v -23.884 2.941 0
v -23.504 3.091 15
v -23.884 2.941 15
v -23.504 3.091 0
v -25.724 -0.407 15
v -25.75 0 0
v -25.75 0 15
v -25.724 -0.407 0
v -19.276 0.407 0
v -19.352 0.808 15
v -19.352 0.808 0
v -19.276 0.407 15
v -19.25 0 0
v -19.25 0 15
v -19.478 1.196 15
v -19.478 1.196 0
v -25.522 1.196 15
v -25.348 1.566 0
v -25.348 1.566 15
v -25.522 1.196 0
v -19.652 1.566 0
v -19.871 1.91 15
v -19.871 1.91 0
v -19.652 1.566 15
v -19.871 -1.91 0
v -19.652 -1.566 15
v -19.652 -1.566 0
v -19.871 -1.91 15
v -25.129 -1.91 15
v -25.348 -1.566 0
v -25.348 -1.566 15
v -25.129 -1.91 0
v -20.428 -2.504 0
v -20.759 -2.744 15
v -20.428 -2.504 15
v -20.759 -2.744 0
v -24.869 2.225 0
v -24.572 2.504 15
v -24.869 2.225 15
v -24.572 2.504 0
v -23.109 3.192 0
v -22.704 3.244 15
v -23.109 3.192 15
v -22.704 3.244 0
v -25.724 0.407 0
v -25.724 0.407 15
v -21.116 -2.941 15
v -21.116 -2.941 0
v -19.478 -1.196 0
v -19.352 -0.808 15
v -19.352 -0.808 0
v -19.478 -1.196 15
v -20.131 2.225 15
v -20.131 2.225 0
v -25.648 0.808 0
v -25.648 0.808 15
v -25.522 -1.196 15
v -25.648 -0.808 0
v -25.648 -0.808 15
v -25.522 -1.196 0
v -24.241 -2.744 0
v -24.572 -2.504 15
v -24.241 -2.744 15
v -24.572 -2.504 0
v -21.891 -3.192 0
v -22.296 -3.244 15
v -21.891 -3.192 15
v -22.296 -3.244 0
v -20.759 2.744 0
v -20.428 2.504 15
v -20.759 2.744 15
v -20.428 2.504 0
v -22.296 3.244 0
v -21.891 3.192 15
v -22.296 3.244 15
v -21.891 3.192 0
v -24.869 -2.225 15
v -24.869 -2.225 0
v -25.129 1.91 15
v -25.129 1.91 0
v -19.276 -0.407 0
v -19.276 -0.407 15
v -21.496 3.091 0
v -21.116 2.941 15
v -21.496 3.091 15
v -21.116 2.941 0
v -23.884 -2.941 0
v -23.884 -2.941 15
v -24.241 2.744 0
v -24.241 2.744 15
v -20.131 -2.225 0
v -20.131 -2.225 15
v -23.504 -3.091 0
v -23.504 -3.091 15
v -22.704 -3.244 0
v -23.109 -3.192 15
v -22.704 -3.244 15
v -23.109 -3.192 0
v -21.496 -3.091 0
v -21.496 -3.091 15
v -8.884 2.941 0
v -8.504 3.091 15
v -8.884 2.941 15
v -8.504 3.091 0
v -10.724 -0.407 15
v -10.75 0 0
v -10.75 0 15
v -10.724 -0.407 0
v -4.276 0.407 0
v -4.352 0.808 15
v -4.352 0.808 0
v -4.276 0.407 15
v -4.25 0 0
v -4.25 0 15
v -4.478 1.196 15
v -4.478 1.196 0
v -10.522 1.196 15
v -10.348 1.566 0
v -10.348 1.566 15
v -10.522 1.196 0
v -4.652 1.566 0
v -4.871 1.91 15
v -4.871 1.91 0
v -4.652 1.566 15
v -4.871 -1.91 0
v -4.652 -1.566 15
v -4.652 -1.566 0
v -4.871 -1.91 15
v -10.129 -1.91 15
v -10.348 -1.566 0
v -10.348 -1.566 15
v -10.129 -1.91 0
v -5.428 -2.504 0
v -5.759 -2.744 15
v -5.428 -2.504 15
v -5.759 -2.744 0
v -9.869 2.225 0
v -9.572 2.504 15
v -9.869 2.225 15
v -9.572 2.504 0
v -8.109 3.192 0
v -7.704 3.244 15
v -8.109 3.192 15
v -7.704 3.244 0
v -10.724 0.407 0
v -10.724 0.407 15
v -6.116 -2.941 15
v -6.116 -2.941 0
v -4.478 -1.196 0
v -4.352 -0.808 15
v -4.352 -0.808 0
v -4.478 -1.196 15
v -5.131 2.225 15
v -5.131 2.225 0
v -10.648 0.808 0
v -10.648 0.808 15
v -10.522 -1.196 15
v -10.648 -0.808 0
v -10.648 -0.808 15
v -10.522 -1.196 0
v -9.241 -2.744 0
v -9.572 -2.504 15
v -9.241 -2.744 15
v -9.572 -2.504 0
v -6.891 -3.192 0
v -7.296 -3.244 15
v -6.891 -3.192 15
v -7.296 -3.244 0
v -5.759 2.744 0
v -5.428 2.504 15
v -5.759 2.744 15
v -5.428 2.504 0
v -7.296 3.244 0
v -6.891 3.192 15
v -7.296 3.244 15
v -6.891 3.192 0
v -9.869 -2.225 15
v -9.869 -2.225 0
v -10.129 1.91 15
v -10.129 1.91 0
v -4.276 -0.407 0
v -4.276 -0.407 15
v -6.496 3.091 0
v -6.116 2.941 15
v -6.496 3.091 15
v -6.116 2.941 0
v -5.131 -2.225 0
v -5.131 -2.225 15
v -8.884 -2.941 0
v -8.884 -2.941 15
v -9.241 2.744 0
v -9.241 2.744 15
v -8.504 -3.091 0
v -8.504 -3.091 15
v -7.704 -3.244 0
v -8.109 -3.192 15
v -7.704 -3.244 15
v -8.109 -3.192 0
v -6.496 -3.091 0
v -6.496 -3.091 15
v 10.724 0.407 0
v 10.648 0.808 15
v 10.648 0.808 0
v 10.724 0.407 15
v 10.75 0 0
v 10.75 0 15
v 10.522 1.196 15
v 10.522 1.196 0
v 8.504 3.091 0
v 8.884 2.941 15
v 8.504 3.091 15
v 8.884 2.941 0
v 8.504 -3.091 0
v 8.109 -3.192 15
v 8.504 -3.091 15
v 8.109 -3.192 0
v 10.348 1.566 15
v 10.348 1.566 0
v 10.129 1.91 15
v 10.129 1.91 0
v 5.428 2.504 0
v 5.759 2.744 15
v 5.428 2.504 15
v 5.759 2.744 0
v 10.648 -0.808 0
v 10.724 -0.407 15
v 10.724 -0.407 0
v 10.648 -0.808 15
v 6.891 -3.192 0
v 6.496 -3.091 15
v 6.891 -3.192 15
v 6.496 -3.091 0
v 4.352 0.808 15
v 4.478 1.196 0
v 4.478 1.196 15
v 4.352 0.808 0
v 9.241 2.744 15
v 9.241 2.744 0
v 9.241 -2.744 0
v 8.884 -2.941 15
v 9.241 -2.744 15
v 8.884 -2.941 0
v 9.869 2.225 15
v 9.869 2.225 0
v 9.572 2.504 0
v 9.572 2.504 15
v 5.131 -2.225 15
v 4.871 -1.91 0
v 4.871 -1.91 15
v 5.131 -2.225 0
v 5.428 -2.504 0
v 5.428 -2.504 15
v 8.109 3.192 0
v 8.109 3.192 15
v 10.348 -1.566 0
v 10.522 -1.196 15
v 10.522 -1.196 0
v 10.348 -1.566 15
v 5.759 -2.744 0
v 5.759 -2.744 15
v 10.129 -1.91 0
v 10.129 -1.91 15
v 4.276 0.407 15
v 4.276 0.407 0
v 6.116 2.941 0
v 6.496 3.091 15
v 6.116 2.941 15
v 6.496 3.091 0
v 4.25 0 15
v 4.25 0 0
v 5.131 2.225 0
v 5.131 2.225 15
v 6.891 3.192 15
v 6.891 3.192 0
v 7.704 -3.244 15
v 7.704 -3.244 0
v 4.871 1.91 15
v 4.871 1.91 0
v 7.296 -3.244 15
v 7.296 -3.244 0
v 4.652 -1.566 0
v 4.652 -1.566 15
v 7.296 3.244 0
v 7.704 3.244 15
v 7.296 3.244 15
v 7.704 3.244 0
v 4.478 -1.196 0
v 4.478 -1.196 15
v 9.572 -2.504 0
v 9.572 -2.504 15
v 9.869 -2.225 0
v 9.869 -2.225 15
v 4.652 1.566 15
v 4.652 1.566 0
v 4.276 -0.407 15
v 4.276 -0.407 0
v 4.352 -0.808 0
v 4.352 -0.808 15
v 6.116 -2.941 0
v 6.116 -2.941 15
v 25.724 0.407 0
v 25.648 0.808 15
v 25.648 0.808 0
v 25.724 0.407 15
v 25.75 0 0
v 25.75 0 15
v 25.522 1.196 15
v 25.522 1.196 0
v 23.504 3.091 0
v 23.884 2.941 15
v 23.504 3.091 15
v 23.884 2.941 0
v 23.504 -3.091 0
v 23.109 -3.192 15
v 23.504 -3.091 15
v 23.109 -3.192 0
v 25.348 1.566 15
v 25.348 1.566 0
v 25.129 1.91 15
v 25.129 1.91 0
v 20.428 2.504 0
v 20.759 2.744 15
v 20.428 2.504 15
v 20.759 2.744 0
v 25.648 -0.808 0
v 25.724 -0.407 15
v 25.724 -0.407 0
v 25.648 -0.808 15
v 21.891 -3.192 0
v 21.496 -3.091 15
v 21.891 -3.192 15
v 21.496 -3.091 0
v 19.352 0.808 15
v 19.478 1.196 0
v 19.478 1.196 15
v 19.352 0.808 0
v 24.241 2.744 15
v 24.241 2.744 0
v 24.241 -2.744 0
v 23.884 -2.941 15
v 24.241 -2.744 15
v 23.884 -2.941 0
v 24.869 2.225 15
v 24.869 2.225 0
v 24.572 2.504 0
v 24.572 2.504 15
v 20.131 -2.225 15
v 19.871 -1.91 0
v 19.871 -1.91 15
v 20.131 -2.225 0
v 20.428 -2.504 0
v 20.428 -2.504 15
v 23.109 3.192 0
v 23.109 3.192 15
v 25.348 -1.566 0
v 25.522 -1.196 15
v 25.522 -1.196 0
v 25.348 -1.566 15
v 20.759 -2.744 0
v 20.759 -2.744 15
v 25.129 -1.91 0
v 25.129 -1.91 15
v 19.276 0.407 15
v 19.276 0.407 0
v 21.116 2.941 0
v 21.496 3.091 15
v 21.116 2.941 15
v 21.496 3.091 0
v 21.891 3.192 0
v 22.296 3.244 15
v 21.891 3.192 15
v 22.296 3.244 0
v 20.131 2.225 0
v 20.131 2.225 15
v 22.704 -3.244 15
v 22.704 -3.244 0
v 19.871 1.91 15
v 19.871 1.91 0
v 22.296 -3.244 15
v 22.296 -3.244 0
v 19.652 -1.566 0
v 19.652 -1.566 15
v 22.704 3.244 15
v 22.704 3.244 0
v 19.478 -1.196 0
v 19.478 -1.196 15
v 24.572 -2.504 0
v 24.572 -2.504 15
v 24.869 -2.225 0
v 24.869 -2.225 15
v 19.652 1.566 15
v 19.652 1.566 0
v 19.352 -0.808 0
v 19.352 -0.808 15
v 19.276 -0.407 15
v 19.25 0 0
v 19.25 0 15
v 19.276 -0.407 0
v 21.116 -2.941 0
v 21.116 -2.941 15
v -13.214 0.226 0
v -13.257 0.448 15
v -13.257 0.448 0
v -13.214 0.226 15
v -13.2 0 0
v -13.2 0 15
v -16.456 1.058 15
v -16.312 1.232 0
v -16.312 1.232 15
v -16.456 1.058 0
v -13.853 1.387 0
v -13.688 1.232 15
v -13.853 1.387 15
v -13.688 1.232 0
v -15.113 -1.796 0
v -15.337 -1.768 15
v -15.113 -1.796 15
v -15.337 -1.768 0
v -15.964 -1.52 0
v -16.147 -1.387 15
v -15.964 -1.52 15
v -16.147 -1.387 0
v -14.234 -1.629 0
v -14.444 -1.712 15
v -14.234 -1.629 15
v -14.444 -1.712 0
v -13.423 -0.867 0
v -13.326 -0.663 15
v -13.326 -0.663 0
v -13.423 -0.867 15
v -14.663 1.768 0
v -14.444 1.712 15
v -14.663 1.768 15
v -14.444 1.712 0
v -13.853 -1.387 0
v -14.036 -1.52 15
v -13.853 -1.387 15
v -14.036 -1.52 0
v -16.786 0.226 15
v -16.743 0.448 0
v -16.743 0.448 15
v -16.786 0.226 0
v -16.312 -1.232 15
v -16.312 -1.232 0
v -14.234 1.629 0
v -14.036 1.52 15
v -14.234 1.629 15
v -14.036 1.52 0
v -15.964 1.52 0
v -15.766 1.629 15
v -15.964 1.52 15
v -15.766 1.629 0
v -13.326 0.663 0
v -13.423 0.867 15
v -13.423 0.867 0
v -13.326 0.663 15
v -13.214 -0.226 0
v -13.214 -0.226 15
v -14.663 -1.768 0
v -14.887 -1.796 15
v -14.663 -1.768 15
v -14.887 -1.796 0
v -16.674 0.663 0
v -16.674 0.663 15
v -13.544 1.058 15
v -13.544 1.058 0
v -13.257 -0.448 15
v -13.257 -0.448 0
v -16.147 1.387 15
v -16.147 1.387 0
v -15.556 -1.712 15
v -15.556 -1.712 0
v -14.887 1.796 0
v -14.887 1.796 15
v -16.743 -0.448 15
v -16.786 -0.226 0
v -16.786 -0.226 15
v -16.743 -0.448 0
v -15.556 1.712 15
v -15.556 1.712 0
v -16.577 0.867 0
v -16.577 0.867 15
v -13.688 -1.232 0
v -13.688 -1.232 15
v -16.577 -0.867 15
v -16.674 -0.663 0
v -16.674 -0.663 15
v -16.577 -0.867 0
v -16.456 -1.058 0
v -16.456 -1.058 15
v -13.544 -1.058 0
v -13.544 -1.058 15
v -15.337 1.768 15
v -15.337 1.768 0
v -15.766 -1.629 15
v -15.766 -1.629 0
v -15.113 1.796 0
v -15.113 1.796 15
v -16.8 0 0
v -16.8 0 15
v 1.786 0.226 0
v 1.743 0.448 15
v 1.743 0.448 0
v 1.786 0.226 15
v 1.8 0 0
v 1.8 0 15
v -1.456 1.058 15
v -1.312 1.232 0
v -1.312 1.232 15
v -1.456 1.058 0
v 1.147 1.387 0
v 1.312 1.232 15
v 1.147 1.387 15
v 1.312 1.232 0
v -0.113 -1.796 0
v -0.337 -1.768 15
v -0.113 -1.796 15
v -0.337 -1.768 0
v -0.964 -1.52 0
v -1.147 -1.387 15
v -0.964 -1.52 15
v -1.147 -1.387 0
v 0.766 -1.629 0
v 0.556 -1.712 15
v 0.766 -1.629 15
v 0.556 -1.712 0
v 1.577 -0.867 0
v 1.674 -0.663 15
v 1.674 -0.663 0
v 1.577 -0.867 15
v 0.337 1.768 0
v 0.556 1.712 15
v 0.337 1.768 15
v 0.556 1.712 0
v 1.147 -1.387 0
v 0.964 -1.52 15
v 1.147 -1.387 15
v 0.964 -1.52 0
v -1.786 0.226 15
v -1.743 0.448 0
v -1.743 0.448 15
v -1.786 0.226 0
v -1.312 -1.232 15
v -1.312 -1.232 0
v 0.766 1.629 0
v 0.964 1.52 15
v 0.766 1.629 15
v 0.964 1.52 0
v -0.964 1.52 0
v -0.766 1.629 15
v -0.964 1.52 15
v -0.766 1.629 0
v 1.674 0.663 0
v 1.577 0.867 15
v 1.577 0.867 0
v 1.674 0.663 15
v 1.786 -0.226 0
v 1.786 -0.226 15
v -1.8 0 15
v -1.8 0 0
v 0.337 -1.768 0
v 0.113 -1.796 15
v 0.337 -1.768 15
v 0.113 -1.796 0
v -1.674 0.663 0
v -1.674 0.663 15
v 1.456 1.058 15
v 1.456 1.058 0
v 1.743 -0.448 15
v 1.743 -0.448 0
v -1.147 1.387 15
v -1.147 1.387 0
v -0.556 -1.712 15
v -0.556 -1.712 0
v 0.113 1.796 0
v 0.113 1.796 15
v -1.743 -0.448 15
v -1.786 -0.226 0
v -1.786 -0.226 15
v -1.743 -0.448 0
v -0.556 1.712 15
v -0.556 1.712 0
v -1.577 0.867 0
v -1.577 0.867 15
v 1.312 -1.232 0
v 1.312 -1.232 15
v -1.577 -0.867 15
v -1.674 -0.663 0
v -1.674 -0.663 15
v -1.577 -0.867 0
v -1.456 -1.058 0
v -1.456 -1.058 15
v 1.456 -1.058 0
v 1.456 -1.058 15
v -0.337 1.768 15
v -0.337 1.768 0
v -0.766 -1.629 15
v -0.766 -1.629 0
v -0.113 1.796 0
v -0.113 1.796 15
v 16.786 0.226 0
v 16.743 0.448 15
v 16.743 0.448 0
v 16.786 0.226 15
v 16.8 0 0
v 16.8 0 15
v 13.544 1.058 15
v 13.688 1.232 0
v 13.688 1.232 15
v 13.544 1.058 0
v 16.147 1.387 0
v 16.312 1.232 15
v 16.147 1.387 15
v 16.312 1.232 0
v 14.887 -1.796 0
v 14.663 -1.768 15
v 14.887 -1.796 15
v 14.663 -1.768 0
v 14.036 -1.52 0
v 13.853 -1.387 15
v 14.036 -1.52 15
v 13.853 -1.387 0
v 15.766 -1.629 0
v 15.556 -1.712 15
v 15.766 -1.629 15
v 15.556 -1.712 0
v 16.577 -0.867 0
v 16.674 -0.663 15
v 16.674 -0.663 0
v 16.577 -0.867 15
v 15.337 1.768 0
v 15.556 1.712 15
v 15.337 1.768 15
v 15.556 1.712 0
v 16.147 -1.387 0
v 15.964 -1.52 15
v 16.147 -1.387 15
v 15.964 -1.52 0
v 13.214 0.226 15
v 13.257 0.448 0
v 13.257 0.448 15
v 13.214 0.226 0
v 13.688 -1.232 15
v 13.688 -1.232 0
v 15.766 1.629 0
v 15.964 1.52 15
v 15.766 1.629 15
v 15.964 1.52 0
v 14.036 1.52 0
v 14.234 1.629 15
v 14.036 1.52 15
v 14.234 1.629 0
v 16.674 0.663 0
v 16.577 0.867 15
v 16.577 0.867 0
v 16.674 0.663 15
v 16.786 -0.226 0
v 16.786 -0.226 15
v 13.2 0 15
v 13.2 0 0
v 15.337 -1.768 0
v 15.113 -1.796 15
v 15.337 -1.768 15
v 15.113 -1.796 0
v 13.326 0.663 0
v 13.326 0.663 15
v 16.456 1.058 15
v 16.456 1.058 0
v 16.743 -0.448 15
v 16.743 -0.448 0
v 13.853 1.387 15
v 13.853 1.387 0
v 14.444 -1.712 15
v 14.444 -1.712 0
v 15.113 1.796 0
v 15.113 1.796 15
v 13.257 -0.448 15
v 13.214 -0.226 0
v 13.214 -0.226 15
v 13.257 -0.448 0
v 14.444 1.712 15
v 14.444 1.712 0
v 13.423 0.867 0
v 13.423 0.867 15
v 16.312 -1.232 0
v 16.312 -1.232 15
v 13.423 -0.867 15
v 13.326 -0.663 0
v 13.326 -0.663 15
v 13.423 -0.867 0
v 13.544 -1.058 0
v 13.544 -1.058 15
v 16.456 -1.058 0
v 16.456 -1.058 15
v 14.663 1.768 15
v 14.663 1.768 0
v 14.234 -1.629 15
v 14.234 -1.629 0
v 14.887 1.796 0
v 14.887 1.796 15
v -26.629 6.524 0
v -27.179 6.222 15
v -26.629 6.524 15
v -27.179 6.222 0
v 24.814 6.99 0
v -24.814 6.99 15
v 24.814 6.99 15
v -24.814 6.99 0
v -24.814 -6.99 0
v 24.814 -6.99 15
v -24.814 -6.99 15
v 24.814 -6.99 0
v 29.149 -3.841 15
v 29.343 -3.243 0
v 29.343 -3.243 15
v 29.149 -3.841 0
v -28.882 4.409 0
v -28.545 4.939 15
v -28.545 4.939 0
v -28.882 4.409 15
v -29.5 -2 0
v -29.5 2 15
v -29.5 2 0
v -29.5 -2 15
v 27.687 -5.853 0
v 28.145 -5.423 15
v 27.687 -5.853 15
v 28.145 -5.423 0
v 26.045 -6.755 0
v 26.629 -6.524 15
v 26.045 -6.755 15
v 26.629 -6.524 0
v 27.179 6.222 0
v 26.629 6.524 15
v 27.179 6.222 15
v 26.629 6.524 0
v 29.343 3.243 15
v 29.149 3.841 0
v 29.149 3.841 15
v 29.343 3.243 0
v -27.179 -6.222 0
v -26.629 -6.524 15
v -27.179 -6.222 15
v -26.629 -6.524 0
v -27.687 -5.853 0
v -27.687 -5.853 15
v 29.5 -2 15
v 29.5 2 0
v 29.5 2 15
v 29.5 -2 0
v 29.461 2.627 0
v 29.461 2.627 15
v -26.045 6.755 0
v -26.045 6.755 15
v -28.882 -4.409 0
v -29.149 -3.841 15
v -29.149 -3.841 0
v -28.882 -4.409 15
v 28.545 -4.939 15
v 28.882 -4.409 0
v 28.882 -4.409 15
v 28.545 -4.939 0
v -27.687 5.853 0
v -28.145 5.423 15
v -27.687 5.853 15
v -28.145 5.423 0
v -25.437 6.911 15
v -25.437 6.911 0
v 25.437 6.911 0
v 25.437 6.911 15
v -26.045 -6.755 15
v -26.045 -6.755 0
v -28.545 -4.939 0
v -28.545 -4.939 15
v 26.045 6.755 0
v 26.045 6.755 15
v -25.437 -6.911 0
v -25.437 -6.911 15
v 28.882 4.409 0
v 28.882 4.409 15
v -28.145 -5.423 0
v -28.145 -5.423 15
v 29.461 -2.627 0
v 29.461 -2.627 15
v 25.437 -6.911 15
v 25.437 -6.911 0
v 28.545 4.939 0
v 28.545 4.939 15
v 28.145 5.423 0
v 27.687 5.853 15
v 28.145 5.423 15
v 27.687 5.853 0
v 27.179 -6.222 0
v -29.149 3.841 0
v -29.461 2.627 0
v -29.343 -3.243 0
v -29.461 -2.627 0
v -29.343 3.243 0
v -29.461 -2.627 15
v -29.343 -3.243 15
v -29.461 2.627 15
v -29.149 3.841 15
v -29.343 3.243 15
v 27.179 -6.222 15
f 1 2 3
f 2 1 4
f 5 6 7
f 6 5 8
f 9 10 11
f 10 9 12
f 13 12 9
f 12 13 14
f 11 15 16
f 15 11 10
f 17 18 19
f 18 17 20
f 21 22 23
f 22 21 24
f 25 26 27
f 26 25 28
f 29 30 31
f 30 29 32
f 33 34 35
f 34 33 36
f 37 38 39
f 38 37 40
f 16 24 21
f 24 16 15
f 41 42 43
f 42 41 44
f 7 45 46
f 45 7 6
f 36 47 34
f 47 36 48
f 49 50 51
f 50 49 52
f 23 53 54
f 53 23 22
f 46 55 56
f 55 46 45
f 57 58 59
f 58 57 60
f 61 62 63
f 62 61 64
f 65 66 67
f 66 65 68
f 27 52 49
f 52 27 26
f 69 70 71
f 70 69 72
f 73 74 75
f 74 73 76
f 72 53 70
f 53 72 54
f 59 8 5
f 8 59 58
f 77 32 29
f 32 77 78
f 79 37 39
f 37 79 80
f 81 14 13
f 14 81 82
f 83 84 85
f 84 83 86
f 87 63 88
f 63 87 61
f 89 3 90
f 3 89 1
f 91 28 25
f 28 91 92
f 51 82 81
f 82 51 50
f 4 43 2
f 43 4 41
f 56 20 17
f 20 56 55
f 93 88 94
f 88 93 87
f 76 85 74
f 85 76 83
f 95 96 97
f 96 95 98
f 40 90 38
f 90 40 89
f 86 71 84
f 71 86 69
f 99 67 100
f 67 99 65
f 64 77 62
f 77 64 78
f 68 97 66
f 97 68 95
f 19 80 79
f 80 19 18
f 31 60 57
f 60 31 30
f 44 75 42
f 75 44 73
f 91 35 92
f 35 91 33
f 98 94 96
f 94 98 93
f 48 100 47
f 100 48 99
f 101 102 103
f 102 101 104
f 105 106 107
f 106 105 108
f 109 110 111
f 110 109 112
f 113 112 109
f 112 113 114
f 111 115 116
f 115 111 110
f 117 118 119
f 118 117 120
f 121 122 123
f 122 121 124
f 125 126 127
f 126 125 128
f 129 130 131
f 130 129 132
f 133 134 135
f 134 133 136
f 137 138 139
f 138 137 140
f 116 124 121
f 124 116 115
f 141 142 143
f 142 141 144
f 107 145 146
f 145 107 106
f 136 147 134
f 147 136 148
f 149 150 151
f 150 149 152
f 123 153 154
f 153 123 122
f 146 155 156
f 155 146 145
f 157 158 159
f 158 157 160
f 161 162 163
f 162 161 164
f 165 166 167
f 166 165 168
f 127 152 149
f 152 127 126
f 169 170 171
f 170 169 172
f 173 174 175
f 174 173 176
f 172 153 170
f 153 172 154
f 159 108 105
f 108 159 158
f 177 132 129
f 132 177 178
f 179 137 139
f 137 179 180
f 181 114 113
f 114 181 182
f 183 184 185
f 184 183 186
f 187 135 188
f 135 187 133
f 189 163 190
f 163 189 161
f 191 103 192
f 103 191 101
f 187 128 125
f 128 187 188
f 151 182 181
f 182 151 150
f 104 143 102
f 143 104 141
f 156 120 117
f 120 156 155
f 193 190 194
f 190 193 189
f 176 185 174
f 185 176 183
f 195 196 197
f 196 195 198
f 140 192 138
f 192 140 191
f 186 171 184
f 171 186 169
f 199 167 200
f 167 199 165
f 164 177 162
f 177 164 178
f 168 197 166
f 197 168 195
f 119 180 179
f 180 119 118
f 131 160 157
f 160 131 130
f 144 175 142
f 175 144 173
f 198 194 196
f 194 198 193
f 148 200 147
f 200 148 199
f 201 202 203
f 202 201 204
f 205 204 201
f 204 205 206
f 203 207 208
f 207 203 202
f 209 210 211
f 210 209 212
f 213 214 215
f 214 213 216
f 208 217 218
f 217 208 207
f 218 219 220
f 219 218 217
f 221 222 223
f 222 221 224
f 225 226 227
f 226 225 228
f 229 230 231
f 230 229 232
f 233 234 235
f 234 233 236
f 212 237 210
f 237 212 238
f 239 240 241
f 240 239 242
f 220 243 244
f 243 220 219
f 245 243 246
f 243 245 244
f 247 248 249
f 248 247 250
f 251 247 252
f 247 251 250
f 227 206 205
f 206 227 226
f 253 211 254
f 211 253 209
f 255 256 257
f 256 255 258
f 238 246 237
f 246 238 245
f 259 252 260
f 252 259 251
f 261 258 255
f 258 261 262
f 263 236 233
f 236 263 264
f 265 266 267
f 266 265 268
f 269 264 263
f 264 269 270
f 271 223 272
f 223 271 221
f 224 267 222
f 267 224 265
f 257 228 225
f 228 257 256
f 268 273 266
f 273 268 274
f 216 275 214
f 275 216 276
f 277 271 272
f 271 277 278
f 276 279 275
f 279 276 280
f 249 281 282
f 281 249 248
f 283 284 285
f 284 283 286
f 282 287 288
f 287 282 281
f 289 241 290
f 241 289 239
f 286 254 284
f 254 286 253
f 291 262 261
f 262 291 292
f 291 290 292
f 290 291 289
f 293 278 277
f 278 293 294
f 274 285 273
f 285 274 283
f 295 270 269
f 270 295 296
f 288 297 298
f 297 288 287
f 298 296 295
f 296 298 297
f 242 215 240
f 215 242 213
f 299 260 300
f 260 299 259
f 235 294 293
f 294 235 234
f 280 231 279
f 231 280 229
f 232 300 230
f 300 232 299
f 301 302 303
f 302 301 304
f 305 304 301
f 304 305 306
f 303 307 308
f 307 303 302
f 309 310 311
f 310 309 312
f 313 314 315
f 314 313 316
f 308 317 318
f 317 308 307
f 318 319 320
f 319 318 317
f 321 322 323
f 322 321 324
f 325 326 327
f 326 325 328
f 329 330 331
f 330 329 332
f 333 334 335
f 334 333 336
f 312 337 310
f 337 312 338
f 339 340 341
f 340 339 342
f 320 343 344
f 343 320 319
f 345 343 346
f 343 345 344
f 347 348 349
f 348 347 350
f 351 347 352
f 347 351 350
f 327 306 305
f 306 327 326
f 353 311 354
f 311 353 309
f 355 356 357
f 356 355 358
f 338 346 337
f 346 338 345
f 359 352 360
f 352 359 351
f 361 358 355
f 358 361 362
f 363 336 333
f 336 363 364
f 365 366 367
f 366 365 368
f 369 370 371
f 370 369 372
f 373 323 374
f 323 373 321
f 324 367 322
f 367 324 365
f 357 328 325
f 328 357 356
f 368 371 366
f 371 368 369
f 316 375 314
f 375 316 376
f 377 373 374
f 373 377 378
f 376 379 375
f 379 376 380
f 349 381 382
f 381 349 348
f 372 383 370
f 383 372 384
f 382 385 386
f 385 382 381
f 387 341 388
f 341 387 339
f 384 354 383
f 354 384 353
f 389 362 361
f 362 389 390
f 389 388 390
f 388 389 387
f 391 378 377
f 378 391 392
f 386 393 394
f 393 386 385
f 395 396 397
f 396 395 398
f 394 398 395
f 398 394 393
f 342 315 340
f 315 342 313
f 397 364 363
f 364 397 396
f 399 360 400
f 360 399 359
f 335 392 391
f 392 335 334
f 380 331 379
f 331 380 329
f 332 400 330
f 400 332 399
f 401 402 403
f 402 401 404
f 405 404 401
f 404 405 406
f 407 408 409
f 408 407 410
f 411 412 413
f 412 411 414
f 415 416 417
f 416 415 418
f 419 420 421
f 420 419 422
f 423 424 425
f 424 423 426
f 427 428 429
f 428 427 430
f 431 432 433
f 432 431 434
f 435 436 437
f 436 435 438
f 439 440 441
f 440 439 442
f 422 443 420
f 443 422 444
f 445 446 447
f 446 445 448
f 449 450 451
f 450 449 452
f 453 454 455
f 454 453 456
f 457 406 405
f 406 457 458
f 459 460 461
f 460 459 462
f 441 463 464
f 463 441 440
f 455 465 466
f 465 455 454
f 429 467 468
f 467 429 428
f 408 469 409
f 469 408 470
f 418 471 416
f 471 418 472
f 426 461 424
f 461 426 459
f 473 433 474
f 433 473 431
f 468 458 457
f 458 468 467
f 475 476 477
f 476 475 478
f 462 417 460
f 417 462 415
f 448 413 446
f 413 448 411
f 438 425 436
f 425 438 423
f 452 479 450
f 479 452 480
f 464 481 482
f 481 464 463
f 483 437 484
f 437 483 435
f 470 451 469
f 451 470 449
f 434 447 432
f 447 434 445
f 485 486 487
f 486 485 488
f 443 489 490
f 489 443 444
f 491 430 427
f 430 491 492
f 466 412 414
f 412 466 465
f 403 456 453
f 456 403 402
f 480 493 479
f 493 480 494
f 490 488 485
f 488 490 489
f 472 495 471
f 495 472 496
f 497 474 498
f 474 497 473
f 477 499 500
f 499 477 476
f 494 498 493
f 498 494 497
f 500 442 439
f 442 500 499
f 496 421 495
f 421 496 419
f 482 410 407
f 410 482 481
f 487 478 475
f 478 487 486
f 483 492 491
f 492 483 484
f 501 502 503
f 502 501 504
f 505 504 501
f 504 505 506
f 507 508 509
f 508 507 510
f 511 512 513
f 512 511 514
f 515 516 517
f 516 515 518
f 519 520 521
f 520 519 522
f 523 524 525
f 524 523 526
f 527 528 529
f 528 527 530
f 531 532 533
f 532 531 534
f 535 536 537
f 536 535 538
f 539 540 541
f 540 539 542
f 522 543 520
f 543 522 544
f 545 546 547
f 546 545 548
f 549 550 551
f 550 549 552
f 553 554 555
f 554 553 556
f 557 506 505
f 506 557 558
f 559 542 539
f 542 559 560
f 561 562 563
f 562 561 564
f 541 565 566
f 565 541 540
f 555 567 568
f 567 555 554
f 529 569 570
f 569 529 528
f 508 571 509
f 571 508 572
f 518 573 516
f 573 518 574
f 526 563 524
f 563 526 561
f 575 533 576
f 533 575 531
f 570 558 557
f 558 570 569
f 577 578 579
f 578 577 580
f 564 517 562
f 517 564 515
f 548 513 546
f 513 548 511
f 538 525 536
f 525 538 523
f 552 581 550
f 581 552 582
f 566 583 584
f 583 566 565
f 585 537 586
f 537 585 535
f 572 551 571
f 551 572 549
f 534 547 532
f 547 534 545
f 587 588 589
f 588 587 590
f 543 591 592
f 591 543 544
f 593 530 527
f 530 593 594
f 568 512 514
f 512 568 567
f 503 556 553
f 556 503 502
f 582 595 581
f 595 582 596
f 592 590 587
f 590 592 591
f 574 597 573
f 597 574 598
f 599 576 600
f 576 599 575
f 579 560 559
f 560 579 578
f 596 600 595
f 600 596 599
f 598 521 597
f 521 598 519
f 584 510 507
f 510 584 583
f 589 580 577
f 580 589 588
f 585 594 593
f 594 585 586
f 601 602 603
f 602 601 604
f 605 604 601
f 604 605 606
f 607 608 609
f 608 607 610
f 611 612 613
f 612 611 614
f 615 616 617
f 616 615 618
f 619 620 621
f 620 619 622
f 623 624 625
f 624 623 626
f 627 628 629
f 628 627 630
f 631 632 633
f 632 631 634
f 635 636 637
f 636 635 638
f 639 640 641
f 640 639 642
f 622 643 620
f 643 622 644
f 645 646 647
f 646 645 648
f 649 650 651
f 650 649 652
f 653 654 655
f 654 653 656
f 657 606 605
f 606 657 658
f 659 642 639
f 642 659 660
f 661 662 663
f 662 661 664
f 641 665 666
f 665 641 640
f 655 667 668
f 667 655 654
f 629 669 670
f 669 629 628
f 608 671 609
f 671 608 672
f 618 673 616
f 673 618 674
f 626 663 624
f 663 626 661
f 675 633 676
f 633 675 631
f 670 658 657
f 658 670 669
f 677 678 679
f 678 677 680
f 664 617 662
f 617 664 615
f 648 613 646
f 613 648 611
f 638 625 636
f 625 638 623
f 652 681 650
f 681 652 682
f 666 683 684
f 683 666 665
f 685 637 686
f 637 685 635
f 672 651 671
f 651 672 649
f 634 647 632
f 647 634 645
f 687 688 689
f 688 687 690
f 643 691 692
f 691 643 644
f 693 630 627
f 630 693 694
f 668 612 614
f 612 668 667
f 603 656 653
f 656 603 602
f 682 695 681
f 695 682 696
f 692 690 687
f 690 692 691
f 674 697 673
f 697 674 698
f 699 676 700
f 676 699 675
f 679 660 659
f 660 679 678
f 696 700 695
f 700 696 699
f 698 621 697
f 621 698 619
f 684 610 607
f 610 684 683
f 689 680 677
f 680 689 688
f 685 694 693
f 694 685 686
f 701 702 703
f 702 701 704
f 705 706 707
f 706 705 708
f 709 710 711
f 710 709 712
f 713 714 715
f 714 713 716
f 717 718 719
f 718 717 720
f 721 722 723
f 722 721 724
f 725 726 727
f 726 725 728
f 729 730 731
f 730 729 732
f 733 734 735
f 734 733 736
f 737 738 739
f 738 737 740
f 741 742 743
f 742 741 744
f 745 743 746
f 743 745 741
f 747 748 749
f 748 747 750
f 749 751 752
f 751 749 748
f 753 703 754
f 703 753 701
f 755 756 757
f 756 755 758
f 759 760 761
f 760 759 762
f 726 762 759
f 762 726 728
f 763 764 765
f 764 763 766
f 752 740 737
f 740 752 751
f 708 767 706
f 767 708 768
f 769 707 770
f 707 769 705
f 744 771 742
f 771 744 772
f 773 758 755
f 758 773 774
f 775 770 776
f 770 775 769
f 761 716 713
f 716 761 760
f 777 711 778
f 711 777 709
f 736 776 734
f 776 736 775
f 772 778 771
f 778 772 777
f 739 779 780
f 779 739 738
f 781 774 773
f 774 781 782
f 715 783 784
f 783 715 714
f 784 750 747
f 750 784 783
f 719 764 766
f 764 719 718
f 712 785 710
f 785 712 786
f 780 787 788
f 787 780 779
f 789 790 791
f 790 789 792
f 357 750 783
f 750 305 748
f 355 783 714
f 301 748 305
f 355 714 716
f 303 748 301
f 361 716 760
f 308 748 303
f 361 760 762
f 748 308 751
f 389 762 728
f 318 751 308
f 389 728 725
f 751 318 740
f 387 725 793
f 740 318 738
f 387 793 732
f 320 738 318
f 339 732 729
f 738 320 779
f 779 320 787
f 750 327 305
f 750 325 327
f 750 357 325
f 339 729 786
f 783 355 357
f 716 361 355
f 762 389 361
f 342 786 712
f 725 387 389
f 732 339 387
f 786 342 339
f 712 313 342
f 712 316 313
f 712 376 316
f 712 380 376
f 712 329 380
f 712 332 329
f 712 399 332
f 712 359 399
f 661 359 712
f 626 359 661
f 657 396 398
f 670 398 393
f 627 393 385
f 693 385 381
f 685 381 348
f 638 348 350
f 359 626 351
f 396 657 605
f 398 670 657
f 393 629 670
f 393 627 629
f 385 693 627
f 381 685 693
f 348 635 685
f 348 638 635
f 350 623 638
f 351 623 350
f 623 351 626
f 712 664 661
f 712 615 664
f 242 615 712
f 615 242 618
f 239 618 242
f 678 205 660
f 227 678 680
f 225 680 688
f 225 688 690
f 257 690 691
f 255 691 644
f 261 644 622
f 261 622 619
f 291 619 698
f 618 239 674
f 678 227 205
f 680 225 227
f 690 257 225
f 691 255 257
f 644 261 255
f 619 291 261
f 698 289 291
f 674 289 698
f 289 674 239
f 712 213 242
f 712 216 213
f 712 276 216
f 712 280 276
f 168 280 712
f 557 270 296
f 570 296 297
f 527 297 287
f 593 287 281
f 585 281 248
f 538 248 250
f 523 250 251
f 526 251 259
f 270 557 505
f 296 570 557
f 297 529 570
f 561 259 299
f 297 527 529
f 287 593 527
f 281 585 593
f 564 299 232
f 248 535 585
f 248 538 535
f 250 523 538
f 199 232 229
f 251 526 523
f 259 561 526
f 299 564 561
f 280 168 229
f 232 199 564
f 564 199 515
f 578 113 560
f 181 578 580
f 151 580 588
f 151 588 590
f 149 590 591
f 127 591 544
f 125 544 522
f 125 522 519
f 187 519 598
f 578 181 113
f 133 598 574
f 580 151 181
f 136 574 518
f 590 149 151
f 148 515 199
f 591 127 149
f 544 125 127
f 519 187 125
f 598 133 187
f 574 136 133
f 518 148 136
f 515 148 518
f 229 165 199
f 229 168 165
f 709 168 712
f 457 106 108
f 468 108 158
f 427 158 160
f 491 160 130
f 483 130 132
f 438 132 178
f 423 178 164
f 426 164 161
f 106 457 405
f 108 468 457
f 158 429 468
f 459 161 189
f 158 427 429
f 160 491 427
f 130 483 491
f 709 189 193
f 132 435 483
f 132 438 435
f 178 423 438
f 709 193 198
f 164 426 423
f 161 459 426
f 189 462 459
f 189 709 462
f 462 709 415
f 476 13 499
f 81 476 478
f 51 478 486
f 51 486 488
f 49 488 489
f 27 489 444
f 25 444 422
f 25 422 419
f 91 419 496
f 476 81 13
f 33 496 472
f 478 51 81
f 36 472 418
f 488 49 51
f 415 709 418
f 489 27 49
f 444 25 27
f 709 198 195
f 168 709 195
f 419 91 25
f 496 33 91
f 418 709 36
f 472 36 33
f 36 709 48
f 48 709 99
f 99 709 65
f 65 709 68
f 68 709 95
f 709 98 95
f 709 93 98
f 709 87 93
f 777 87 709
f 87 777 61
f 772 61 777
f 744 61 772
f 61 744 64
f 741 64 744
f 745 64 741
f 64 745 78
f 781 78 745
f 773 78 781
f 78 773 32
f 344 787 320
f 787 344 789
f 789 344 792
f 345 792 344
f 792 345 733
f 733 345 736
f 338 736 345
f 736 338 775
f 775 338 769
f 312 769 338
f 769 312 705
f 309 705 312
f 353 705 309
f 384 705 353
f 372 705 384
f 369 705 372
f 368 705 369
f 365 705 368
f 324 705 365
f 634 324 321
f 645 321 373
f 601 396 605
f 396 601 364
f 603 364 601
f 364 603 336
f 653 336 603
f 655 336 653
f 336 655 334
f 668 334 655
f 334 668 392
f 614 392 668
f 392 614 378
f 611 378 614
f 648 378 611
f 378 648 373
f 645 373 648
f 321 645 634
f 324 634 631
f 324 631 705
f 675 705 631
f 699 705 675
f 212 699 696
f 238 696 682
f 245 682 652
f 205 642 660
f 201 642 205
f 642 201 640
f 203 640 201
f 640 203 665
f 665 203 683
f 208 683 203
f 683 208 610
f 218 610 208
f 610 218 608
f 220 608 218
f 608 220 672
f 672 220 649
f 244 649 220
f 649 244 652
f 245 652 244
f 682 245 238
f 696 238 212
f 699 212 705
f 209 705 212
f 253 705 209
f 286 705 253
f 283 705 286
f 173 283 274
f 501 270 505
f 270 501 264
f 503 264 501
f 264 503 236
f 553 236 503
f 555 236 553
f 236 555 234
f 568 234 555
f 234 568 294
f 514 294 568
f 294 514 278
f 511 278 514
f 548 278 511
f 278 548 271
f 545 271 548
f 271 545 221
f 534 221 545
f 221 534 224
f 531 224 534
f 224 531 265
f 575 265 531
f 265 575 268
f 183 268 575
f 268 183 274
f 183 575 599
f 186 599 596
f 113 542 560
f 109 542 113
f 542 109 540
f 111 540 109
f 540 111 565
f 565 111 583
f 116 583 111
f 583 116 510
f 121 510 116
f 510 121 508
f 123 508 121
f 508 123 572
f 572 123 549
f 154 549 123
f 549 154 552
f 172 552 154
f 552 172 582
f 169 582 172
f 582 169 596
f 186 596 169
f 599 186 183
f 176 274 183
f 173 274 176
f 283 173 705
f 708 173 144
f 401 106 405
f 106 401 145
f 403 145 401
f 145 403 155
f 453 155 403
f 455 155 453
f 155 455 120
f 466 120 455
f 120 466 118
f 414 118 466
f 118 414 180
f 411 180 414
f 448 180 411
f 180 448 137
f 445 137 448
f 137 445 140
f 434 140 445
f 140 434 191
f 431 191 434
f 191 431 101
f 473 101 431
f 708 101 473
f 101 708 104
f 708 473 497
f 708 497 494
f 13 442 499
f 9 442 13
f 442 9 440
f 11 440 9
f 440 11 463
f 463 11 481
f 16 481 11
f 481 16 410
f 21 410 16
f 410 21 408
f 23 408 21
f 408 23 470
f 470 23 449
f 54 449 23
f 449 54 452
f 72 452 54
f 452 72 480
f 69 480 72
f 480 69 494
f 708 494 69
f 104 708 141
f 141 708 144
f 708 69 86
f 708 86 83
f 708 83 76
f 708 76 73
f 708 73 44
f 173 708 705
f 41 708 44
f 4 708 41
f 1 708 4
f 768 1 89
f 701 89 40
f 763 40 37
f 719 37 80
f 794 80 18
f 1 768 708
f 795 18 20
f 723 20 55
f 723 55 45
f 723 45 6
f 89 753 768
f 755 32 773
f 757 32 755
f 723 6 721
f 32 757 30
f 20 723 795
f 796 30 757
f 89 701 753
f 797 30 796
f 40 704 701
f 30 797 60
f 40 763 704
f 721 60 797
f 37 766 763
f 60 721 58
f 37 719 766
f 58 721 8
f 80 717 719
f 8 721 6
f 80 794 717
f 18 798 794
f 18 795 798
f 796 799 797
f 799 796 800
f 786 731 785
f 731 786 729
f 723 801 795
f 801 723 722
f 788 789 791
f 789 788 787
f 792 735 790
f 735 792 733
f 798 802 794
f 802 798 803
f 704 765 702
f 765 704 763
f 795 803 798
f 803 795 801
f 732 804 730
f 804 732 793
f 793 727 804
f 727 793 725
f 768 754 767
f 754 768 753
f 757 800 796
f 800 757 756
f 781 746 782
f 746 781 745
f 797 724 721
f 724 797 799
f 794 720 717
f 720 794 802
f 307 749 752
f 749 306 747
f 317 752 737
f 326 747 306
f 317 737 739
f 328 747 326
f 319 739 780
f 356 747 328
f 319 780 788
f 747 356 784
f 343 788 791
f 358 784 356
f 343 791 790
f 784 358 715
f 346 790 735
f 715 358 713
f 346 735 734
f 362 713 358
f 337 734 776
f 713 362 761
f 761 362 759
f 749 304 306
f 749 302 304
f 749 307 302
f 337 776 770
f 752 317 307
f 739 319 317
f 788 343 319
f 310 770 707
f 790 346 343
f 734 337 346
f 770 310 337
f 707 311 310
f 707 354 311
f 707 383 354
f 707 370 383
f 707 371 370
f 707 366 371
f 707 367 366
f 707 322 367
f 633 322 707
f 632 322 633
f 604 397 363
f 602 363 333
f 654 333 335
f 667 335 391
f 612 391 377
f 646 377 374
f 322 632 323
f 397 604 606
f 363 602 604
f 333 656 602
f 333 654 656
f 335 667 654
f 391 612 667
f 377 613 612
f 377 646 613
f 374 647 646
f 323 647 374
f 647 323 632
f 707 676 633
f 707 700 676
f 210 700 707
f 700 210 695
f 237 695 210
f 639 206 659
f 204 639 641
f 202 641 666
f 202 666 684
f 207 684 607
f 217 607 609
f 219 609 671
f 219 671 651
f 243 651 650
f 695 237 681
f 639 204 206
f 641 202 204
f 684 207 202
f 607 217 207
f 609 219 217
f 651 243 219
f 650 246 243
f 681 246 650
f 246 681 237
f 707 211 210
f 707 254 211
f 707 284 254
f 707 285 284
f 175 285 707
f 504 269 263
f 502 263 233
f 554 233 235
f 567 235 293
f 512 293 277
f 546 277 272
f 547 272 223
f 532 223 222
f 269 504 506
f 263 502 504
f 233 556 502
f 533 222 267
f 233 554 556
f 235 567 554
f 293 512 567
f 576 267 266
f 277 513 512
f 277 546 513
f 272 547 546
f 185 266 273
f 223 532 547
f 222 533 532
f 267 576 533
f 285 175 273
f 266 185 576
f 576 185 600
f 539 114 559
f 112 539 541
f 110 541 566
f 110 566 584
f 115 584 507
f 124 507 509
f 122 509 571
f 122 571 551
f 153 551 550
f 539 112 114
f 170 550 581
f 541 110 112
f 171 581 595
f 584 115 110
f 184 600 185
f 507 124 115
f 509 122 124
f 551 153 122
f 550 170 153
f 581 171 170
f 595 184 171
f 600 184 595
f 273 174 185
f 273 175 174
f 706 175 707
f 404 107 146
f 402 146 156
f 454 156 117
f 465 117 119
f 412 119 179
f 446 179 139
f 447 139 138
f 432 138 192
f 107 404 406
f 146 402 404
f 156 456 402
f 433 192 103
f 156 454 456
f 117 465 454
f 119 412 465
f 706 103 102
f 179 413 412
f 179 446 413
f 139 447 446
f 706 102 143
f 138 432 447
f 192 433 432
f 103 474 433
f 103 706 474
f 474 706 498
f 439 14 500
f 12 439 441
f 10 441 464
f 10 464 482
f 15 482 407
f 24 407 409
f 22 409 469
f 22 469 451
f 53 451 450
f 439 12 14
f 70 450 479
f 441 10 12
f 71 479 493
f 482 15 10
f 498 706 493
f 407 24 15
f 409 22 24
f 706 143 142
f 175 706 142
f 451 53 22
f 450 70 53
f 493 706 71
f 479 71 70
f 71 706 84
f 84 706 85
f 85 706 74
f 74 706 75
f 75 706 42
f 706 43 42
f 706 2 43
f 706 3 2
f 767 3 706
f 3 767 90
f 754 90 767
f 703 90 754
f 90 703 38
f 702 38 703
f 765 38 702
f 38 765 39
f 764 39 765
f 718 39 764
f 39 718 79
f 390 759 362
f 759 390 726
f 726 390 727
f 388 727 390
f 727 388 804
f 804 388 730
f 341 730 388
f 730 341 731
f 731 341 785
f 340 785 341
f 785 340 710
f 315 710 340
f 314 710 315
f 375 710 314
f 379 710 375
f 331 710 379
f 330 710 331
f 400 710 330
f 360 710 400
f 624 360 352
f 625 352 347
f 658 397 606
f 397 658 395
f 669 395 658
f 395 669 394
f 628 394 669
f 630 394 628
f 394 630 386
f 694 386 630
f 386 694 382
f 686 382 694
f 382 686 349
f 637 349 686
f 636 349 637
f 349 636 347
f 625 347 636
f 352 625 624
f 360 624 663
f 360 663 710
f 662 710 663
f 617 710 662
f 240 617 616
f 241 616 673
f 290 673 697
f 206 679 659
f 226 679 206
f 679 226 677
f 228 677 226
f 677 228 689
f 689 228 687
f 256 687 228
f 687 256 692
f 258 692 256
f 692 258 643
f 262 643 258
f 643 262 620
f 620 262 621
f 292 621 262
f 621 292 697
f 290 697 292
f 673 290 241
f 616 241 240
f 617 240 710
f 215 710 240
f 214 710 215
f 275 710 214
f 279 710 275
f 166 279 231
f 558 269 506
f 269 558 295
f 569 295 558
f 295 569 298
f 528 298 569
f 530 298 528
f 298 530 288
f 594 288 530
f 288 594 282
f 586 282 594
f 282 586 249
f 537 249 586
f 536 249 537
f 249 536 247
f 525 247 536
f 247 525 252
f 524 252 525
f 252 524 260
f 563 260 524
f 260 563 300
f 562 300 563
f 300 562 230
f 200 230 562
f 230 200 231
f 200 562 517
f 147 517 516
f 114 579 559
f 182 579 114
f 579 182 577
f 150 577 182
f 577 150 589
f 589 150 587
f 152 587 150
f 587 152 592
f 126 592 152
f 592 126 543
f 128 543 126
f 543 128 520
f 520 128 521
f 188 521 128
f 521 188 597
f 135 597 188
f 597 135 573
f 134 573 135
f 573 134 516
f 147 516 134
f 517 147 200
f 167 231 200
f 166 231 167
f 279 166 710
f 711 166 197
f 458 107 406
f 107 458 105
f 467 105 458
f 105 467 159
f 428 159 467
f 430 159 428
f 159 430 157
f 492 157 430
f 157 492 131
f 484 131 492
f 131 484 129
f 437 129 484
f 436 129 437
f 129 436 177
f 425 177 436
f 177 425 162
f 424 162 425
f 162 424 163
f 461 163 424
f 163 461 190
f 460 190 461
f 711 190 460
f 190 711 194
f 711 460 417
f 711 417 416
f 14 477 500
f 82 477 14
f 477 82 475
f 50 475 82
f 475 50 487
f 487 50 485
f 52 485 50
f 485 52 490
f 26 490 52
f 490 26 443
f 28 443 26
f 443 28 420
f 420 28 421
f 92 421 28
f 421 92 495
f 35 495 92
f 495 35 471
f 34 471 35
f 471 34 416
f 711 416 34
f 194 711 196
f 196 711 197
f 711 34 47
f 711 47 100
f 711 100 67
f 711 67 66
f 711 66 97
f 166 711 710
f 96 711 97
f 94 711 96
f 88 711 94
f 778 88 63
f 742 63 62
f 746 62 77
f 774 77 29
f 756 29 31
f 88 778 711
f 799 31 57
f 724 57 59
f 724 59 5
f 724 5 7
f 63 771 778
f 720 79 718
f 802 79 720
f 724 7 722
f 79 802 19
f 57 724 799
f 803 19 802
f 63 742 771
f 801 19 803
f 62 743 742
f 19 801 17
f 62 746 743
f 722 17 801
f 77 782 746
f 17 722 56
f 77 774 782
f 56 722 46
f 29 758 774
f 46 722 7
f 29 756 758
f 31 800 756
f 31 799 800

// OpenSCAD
$fn = 50;


difference() {
	union() {
		*color(alpha = 1.0000000000, c = "gray") {
			translate(v = [0, 7, 0]) {
				linear_extrude(height = 1) {
					text(font = "Arial:style=Bold", halign = "center", size = 4.5000000000, text = "COMMENT plate main", valign = "center");
				}
			}
		}
		hull() {
			translate(v = [-24.5000000000, 2.0000000000, 0]) {
				cylinder(h = 15, r = 5);
			}
			translate(v = [24.5000000000, 2.0000000000, 0]) {
				cylinder(h = 15, r = 5);
			}
			translate(v = [-24.5000000000, -2.0000000000, 0]) {
				cylinder(h = 15, r = 5);
			}
			translate(v = [24.5000000000, -2.0000000000, 0]) {
				cylinder(h = 15, r = 5);
			}
		}
	}
	union() {
		*color(alpha = 1.0000000000, c = "gray") {
			translate(v = [0, 7, 0]) {
				linear_extrude(height = 1) {
					text(font = "Arial:style=Bold", halign = "center", size = 4.5000000000, text = "COMMENT holes main", valign = "center");
				}
			}
		}
		translate(v = [-22.5000000000, 0.0000000000, 0]) {
			translate(v = [0, 0, -100]) {
				cylinder(h = 200, r = 3.2500000000);
			}
		}
		translate(v = [-7.5000000000, 0.0000000000, 0]) {
			translate(v = [0, 0, -100]) {
				cylinder(h = 200, r = 3.2500000000);
			}
		}
		translate(v = [7.5000000000, 0.0000000000, 0]) {
			translate(v = [0, 0, -100]) {
				cylinder(h = 200, r = 3.2500000000);
			}
		}
		translate(v = [22.5000000000, 0.0000000000, 0]) {
			translate(v = [0, 0, -100]) {
				cylinder(h = 200, r = 3.2500000000);
			}
		}
		translate(v = [-22.5000000000, 0.0000000000, 0]) {
			translate(v = [0, 0, -100]) {
				cylinder(h = 200, r = 1.8000000000);
			}
		}
		translate(v = [-15.0000000000, 0.0000000000, 0]) {
			translate(v = [0, 0, -100]) {
				cylinder(h = 200, r = 1.8000000000);
			}
		}
		translate(v = [-7.5000000000, 0.0000000000, 0]) {
			translate(v = [0, 0, -100]) {
				cylinder(h = 200, r = 1.8000000000);
			}
		}
		translate(v = [0, 0, -100]) {
			cylinder(h = 200, r = 1.8000000000);
		}
		translate(v = [7.5000000000, 0.0000000000, 0]) {
			translate(v = [0, 0, -100]) {
				cylinder(h = 200, r = 1.8000000000);
			}
		}
		translate(v = [15.0000000000, 0.0000000000, 0]) {
			translate(v = [0, 0, -100]) {
				cylinder(h = 200, r = 1.8000000000);
			}
		}
		translate(v = [22.5000000000, 0.0000000000, 0]) {
			translate(v = [0, 0, -100]) {
				cylinder(h = 200, r = 1.8000000000);
			}
		}
	}
}
